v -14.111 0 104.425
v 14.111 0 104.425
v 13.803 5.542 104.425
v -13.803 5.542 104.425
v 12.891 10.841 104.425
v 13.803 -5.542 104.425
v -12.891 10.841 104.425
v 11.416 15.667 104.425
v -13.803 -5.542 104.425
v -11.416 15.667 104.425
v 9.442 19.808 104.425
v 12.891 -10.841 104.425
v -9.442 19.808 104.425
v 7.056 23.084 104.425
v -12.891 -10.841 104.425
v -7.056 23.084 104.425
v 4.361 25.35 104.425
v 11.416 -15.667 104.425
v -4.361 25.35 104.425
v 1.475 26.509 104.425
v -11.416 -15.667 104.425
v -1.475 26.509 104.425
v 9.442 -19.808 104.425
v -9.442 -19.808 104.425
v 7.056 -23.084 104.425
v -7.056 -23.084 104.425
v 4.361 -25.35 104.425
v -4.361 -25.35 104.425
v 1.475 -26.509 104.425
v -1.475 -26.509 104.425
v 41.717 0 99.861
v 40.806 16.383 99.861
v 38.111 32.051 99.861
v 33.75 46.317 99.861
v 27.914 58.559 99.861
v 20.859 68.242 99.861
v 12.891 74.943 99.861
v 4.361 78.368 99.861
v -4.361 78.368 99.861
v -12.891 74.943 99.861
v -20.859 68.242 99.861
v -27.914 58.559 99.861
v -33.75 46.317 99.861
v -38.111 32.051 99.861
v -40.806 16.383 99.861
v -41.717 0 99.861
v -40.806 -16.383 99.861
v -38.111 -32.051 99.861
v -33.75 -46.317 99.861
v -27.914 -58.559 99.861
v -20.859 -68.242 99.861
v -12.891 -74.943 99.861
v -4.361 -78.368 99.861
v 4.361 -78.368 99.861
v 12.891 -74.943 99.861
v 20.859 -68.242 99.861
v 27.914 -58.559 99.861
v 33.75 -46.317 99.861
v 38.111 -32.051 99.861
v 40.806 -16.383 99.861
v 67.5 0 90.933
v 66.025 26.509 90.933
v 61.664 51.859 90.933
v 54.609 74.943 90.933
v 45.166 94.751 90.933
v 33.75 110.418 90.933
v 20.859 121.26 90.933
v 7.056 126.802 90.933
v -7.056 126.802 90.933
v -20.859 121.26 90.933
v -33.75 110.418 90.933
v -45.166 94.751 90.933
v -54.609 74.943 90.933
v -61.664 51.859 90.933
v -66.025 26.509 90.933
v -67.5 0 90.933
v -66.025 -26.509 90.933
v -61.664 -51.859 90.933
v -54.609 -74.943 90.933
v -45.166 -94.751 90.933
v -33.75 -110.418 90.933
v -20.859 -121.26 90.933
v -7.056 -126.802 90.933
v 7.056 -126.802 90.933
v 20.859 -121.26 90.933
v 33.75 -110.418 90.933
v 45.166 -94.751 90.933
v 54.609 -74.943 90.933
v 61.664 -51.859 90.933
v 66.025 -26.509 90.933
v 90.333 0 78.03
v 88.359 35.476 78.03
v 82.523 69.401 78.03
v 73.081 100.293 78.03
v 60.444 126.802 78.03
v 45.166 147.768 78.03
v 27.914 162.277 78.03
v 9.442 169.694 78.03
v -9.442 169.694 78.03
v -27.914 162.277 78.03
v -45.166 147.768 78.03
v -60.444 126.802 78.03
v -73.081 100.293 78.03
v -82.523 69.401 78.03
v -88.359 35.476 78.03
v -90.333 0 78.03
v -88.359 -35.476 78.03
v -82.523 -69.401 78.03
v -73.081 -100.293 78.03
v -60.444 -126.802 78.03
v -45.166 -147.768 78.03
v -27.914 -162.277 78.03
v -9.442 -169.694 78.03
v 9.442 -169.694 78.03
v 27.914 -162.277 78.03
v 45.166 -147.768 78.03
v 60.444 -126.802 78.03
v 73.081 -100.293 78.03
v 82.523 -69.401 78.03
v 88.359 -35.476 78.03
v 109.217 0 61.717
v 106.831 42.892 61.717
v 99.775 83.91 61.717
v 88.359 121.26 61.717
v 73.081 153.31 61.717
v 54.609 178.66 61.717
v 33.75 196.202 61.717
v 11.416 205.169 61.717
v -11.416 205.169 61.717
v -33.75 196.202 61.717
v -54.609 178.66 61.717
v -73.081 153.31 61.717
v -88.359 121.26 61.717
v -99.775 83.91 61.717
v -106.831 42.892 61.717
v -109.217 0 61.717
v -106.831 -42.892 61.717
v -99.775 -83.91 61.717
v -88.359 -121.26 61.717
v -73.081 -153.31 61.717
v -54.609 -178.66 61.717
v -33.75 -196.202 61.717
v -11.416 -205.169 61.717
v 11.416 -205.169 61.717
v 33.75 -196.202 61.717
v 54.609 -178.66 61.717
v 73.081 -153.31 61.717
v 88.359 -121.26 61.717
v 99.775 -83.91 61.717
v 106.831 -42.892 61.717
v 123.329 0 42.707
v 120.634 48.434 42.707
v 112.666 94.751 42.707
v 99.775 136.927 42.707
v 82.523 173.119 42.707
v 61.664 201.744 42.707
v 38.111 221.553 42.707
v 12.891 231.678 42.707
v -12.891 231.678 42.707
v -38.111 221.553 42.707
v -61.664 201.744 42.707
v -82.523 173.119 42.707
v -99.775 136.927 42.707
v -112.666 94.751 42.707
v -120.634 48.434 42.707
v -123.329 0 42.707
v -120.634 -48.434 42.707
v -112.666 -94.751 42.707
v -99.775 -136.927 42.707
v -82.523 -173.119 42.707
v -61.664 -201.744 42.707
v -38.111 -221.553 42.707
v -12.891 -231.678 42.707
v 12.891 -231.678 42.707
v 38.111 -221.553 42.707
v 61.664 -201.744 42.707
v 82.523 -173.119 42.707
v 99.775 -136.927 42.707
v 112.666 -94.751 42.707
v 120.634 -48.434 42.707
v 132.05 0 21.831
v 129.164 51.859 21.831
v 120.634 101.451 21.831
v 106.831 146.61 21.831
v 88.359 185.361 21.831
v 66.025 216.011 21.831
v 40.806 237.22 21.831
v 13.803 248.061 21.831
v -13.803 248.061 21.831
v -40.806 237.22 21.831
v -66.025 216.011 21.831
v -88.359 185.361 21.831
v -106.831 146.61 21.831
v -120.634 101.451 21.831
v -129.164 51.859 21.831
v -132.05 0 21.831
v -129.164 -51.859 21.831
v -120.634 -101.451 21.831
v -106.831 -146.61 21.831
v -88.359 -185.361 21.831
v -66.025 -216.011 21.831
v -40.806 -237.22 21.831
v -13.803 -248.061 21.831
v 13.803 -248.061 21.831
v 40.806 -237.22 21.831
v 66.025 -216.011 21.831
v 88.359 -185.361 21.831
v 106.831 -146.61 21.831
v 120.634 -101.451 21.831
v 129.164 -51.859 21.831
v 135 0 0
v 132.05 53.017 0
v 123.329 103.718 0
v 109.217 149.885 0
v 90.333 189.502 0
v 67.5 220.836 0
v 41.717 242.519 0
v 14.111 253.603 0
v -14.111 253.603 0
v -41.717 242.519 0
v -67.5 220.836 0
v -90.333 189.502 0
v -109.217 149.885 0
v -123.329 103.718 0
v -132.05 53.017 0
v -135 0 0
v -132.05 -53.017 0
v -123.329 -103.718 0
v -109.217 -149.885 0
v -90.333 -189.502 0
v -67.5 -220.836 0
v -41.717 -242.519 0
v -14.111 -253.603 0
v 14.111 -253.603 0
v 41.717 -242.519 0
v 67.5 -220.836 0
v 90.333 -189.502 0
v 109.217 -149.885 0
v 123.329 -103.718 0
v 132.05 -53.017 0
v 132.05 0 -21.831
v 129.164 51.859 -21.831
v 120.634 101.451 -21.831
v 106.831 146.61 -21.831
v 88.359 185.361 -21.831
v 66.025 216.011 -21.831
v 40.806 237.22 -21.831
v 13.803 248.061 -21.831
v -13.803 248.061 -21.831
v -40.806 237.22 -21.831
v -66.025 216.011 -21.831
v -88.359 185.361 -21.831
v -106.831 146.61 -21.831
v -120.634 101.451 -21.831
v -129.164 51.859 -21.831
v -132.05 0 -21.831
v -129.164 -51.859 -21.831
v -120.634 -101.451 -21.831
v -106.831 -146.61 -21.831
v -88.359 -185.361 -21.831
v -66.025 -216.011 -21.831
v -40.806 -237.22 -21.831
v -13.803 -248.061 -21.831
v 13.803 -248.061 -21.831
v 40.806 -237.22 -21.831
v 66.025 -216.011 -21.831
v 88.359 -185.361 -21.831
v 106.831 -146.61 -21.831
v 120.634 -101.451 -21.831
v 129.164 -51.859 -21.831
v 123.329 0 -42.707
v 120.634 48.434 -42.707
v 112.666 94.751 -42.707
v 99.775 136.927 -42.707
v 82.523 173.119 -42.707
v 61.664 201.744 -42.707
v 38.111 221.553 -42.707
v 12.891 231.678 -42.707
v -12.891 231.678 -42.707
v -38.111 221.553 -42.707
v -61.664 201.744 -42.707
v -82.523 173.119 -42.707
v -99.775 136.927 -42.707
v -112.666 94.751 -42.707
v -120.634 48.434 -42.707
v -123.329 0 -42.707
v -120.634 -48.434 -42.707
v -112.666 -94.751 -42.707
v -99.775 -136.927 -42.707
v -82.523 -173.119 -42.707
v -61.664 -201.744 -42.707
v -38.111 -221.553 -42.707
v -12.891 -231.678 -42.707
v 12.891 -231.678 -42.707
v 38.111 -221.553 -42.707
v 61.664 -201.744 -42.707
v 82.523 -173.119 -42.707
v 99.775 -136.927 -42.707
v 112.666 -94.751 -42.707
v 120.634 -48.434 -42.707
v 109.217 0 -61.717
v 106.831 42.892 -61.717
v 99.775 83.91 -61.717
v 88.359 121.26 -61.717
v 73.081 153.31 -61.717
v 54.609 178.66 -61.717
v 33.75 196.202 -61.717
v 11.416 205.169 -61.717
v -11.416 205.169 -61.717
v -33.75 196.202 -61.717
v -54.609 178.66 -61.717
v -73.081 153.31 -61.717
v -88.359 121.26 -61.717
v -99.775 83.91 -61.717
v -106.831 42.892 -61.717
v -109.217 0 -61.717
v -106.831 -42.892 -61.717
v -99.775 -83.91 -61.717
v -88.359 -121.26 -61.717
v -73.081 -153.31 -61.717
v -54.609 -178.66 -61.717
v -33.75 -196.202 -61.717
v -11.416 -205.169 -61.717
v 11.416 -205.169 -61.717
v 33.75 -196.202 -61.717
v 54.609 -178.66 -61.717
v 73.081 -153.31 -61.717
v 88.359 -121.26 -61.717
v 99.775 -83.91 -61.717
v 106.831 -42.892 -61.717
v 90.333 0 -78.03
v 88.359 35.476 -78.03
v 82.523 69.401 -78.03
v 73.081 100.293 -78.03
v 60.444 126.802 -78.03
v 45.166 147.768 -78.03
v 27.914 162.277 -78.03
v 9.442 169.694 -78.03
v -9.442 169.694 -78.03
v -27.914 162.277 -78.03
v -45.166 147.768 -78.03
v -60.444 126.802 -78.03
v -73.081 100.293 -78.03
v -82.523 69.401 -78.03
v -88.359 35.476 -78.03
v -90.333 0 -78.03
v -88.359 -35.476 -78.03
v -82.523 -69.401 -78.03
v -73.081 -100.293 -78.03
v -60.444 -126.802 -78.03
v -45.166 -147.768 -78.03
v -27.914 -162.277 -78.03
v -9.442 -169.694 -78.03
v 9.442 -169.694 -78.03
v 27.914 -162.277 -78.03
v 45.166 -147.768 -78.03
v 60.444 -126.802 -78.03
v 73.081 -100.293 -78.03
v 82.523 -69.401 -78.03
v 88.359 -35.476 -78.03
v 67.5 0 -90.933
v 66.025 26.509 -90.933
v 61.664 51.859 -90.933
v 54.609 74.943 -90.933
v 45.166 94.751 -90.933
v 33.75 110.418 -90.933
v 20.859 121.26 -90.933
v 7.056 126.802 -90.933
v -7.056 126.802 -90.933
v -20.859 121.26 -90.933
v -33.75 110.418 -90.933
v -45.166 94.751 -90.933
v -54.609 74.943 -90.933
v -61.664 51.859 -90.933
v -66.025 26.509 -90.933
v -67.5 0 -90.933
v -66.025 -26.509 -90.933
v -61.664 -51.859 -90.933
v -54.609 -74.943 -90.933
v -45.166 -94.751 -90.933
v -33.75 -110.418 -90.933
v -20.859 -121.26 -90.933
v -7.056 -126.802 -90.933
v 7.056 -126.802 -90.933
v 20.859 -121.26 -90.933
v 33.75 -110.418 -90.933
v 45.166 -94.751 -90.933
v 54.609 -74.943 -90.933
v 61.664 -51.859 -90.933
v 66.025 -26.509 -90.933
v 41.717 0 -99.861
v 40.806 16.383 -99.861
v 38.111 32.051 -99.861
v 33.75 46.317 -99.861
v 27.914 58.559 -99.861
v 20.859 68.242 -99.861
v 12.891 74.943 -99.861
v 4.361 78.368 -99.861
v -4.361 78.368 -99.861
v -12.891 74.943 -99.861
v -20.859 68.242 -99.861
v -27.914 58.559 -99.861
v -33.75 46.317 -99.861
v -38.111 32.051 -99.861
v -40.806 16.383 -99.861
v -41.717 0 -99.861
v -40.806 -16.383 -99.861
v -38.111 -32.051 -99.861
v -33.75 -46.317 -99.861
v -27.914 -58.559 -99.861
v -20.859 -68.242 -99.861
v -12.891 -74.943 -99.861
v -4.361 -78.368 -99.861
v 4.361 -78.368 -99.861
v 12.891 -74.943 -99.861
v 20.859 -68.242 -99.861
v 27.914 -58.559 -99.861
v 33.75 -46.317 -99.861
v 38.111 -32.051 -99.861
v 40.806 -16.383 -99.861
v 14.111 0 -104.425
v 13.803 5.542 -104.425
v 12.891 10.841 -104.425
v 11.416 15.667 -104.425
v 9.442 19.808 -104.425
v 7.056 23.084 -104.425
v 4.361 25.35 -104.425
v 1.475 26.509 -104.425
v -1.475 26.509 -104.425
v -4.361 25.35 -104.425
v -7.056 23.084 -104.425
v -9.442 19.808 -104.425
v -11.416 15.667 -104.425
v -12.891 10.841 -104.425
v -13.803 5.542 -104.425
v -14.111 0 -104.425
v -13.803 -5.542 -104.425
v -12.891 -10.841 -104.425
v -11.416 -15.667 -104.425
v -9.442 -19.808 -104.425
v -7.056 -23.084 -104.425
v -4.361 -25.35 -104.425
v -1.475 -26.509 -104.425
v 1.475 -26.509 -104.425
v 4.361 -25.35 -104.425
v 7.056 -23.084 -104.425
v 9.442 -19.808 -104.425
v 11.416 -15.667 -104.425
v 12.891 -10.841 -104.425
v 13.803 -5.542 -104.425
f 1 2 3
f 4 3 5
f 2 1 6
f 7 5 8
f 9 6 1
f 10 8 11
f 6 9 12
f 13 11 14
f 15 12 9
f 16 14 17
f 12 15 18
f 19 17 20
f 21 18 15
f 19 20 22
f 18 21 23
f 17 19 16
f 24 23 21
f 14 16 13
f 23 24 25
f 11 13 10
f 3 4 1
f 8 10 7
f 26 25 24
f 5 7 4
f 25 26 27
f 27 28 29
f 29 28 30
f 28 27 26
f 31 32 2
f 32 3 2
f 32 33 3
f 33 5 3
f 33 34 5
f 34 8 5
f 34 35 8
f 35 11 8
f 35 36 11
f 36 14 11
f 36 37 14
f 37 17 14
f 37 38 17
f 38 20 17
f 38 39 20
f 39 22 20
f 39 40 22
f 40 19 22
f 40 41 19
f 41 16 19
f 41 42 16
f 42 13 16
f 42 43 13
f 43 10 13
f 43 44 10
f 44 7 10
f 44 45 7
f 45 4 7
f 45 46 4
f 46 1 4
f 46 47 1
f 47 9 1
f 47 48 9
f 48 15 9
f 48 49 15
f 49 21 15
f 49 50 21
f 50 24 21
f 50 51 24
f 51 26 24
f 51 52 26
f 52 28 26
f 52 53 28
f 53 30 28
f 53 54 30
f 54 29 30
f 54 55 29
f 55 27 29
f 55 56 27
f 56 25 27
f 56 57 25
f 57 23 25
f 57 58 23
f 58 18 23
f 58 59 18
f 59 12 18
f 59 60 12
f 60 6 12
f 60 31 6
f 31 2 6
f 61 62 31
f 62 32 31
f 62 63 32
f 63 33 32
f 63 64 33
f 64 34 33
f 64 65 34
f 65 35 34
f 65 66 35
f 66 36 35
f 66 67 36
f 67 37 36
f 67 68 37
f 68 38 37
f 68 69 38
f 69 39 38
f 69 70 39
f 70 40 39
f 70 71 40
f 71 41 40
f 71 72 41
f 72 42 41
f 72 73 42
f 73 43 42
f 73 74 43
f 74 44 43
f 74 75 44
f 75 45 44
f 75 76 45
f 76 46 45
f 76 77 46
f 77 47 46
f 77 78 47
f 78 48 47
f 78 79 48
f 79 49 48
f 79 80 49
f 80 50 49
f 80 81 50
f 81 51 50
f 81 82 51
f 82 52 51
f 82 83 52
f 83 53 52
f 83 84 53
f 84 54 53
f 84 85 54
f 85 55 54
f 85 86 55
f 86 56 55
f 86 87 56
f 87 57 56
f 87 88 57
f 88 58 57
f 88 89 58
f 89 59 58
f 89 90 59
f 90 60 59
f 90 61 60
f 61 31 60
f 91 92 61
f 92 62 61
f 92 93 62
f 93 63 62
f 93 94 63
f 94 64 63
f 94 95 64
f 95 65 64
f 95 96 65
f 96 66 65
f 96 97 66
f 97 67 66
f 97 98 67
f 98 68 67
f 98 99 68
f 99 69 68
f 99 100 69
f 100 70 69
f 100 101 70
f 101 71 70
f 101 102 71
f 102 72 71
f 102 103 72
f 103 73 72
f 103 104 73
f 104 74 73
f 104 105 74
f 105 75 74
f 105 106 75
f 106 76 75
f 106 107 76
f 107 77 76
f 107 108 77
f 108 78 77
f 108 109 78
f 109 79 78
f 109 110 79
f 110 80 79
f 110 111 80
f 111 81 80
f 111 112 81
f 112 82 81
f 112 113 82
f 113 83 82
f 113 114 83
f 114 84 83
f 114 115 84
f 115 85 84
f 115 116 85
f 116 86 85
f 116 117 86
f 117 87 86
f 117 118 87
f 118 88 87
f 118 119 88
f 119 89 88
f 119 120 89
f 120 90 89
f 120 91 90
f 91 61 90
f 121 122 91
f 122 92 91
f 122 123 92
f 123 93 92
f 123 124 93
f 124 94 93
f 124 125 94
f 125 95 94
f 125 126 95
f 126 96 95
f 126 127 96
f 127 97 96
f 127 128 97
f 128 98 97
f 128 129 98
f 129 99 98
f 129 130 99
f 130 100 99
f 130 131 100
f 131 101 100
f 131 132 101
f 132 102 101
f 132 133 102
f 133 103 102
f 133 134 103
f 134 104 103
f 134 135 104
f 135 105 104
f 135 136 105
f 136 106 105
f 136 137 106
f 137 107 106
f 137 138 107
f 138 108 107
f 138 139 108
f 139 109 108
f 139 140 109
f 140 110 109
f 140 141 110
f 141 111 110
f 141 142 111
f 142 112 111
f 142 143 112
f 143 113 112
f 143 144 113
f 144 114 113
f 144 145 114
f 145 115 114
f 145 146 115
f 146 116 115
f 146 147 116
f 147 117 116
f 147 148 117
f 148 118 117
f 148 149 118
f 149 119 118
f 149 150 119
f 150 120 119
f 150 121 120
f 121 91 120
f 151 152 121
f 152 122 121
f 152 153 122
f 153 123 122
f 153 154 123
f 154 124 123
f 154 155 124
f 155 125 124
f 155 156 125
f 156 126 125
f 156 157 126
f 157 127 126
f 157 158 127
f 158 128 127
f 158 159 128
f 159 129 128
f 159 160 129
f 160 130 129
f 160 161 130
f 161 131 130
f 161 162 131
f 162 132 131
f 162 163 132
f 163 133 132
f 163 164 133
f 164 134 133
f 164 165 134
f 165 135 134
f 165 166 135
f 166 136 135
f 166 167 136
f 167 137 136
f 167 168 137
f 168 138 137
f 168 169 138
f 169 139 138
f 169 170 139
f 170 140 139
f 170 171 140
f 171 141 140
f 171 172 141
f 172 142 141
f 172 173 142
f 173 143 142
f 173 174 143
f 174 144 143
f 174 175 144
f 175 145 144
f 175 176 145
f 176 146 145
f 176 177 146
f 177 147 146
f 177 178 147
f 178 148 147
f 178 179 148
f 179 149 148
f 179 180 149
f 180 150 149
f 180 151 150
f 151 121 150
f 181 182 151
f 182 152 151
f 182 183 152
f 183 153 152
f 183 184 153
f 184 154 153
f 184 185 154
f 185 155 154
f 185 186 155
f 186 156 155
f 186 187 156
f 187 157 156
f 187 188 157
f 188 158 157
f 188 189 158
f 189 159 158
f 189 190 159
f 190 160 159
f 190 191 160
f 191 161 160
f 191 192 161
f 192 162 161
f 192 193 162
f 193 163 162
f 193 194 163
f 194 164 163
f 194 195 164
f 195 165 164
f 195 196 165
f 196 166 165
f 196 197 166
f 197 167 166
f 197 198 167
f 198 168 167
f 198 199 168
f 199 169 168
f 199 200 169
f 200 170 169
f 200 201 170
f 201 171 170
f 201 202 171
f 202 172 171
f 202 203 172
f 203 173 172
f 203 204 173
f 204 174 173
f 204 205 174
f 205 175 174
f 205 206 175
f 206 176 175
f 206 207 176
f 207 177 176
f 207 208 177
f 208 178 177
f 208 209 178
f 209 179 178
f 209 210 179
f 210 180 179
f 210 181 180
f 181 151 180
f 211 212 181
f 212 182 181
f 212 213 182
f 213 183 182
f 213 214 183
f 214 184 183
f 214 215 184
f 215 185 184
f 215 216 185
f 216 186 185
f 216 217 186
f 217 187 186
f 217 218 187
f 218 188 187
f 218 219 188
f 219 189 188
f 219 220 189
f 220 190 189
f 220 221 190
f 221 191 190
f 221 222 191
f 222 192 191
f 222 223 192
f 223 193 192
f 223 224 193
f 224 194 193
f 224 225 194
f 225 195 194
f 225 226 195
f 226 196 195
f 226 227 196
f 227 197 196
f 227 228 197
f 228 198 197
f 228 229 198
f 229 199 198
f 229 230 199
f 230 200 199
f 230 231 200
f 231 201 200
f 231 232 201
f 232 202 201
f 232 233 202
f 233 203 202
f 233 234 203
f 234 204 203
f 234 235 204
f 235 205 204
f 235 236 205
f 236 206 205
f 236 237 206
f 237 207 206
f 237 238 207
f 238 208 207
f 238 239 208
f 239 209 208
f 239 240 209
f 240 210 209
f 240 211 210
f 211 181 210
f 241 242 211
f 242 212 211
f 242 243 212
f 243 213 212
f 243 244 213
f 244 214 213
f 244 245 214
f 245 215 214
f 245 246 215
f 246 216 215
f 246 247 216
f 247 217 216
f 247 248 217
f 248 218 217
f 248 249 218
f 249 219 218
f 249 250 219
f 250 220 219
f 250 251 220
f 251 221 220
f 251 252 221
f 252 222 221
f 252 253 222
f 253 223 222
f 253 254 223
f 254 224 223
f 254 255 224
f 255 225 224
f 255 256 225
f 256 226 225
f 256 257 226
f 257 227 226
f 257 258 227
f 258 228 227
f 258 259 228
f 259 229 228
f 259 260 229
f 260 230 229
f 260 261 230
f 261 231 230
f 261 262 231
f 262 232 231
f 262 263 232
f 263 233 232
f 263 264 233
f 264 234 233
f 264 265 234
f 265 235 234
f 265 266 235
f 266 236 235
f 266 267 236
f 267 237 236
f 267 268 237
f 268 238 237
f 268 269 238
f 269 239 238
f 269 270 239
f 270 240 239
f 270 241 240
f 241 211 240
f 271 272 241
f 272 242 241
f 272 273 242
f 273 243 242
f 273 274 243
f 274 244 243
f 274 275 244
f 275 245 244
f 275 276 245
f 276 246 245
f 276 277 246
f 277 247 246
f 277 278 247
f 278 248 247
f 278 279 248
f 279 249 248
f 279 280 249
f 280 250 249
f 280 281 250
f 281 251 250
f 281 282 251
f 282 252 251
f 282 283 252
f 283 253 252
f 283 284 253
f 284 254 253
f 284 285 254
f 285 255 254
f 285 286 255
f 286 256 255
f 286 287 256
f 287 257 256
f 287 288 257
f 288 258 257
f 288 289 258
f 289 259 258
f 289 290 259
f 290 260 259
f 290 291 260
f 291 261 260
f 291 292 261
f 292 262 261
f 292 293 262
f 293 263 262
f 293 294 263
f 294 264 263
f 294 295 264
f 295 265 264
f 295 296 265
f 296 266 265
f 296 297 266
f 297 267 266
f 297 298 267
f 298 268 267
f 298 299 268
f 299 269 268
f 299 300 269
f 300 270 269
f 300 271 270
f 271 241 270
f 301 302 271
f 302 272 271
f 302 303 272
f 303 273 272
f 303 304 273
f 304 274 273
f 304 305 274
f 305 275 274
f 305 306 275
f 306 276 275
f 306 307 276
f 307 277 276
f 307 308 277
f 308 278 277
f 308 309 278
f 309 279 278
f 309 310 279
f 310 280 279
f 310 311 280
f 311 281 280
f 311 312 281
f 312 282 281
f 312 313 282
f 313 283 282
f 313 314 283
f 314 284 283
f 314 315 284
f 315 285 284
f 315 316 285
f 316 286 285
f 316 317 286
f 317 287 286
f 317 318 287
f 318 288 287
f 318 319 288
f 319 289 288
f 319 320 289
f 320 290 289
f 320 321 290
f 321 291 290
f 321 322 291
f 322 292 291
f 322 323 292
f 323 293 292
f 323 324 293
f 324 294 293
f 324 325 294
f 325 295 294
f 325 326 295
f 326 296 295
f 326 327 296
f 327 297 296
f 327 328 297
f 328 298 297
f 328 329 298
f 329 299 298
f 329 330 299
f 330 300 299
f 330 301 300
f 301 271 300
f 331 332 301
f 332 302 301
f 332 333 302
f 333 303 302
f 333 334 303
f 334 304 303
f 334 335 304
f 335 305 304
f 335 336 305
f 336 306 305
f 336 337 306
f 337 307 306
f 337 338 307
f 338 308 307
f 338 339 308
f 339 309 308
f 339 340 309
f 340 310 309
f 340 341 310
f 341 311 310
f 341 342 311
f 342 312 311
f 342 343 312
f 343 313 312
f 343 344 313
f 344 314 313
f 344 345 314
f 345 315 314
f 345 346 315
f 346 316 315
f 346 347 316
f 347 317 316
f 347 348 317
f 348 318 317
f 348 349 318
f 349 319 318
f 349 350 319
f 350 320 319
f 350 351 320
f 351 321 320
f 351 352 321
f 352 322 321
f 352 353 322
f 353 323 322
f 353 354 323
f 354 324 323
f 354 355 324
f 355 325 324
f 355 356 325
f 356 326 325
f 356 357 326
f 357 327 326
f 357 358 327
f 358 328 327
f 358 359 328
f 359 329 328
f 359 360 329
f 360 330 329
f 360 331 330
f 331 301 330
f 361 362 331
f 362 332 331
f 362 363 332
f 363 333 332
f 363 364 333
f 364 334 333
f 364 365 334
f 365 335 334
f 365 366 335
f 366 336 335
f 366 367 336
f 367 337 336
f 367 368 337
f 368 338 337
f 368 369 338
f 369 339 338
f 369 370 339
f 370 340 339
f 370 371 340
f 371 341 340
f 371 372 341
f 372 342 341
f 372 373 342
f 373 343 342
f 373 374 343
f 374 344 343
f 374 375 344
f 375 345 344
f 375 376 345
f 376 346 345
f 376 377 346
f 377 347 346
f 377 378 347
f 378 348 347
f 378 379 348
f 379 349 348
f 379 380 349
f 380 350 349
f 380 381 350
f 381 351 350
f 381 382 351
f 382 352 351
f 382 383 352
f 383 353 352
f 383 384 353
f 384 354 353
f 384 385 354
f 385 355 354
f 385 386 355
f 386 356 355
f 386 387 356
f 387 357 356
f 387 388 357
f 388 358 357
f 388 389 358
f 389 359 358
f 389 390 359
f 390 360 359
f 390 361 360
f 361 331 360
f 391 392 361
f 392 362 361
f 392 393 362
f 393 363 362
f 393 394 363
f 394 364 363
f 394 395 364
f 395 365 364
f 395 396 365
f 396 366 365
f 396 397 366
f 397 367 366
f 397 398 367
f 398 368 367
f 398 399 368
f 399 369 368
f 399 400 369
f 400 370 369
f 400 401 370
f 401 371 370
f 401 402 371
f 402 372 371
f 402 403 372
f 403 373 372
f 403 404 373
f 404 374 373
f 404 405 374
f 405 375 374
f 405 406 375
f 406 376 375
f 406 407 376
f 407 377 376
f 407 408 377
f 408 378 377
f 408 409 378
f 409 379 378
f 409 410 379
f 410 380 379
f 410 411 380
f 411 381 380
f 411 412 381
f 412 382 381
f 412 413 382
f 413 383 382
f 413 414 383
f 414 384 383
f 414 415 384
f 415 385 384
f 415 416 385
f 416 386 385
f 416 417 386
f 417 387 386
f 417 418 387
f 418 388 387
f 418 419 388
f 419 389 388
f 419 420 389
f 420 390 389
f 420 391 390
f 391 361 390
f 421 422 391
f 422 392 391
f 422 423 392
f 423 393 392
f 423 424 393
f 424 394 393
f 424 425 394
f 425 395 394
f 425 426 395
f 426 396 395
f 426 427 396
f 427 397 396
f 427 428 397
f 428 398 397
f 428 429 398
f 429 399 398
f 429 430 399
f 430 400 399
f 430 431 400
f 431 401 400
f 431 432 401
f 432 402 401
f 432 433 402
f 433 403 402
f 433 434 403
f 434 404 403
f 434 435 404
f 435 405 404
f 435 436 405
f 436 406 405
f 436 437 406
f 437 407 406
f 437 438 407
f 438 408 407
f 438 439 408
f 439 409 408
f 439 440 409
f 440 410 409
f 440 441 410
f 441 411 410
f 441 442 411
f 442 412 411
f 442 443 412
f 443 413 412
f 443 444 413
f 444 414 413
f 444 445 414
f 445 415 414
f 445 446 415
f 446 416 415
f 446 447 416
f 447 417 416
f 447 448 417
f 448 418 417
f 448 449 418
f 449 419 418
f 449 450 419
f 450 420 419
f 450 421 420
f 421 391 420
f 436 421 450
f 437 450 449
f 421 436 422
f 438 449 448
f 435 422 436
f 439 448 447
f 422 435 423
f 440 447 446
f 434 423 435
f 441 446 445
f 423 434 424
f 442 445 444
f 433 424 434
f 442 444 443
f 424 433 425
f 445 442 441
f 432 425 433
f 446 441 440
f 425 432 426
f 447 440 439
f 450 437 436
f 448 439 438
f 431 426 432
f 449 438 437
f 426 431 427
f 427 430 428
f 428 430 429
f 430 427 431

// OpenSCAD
// Generated by SolidPython 1.0.1 on 2020-07-29 00:46:49


scale(v = [9, 17, 7]) {
	sphere(r = 15);
}
/***********************************************
*********      SolidPython code:      **********
************************************************
 
# import packages: SolidPython
from solid import *
from solid.utils import *
from itertools import chain, combinations, permutations


class Resize:

    def __init__(self, scad_file):
        self.scad_file = scad_file
        #self.scad_file = import_scad(scad_file)
        # cone/cylinder param:
        self.r1 = 0
        self.r2 = 0
        self.h = 0
        # rectangular prism param:
        self.w = 0
        self.l = 0
        # ellipse param:
        self.r = 0

    # import OpenScad code (file name corresponds to shape)


    # classify shape + parameters
    def assign(self, param1, param2, param3):
        if self.scad_file == 'cone.scad':
            self.r1 = param1
            self.r2 = param2
            self.h = param3
        elif self.scad_file == 'cylinder.scad':
            self.r1 = param1
            self.r2 = param2
            self.h = param3
        elif self.scad_file == 'rectangularPrism.scad':
            self.h = param1
            self.l = param2
            self.w = param3
        else:
            self.r = param1
            self.h = param2

    # resize parameters
    def iterate(self):
        x = range(3, 20, 2)
        i = 1
        if self.scad_file == 'cone.scad':
            tempList = list(permutations(x, 2))
            for temp in tempList:
                param1 = temp[0]
                param2 = temp[1]
                filepath = 'produced_scad_files/' + 'cone' + str(param1) + '_' + str(param2) + '_' + '.scad'
                scad_render_to_file(cylinder(h=param1, r1=param2, r2=0), filepath)

        elif self.scad_file == 'cylinder.scad':
            tempList = list(permutations(x, 3))
            for temp in tempList:
                param1 = temp[0]
                param2 = temp[1]
                filepath = 'produced_scad_files/' + 'cylinder' + str(param1) + '_' + str(param2) + '_' + '.scad'
                scad_render_to_file(cylinder(h=param1, r1=param2, r2=param2), filepath)

        elif self.scad_file == 'rectangularPrism.scad':
            tempList = list(permutations(x, 3))
            for temp in tempList:
                param1 = temp[0]
                param2 = temp[1]
                param3 = temp[2]
                filepath = 'produced_scad_files/' + 'rectangularPrism' + str(param1) + '_' + str(param2) + '_' + str(
                    param3) + '.scad'
                scad_render_to_file(cube(size=(param1, param2, param3)), filepath)

        elif self.scad_file == 'ellipse.scad':
            tempList = list(permutations(x, 4))
            for temp in tempList:
                param1 = temp[0]
                param2 = temp[1]
                param3 = temp[2]
                param4 = temp[3]
                filepath = 'produced_scad_files/' + 'ellipse' + str(param1) + '_' + str(param2) + '_' + str(param3) + '_' + str(param4) + '.scad'
                scad_render_to_file(scale([param1, param2, param3])(sphere(r=param4)), filepath)

    def render_to_scadfile(self):
        scad_render_to_file(scad, 'example.scad') 
 
************************************************/
